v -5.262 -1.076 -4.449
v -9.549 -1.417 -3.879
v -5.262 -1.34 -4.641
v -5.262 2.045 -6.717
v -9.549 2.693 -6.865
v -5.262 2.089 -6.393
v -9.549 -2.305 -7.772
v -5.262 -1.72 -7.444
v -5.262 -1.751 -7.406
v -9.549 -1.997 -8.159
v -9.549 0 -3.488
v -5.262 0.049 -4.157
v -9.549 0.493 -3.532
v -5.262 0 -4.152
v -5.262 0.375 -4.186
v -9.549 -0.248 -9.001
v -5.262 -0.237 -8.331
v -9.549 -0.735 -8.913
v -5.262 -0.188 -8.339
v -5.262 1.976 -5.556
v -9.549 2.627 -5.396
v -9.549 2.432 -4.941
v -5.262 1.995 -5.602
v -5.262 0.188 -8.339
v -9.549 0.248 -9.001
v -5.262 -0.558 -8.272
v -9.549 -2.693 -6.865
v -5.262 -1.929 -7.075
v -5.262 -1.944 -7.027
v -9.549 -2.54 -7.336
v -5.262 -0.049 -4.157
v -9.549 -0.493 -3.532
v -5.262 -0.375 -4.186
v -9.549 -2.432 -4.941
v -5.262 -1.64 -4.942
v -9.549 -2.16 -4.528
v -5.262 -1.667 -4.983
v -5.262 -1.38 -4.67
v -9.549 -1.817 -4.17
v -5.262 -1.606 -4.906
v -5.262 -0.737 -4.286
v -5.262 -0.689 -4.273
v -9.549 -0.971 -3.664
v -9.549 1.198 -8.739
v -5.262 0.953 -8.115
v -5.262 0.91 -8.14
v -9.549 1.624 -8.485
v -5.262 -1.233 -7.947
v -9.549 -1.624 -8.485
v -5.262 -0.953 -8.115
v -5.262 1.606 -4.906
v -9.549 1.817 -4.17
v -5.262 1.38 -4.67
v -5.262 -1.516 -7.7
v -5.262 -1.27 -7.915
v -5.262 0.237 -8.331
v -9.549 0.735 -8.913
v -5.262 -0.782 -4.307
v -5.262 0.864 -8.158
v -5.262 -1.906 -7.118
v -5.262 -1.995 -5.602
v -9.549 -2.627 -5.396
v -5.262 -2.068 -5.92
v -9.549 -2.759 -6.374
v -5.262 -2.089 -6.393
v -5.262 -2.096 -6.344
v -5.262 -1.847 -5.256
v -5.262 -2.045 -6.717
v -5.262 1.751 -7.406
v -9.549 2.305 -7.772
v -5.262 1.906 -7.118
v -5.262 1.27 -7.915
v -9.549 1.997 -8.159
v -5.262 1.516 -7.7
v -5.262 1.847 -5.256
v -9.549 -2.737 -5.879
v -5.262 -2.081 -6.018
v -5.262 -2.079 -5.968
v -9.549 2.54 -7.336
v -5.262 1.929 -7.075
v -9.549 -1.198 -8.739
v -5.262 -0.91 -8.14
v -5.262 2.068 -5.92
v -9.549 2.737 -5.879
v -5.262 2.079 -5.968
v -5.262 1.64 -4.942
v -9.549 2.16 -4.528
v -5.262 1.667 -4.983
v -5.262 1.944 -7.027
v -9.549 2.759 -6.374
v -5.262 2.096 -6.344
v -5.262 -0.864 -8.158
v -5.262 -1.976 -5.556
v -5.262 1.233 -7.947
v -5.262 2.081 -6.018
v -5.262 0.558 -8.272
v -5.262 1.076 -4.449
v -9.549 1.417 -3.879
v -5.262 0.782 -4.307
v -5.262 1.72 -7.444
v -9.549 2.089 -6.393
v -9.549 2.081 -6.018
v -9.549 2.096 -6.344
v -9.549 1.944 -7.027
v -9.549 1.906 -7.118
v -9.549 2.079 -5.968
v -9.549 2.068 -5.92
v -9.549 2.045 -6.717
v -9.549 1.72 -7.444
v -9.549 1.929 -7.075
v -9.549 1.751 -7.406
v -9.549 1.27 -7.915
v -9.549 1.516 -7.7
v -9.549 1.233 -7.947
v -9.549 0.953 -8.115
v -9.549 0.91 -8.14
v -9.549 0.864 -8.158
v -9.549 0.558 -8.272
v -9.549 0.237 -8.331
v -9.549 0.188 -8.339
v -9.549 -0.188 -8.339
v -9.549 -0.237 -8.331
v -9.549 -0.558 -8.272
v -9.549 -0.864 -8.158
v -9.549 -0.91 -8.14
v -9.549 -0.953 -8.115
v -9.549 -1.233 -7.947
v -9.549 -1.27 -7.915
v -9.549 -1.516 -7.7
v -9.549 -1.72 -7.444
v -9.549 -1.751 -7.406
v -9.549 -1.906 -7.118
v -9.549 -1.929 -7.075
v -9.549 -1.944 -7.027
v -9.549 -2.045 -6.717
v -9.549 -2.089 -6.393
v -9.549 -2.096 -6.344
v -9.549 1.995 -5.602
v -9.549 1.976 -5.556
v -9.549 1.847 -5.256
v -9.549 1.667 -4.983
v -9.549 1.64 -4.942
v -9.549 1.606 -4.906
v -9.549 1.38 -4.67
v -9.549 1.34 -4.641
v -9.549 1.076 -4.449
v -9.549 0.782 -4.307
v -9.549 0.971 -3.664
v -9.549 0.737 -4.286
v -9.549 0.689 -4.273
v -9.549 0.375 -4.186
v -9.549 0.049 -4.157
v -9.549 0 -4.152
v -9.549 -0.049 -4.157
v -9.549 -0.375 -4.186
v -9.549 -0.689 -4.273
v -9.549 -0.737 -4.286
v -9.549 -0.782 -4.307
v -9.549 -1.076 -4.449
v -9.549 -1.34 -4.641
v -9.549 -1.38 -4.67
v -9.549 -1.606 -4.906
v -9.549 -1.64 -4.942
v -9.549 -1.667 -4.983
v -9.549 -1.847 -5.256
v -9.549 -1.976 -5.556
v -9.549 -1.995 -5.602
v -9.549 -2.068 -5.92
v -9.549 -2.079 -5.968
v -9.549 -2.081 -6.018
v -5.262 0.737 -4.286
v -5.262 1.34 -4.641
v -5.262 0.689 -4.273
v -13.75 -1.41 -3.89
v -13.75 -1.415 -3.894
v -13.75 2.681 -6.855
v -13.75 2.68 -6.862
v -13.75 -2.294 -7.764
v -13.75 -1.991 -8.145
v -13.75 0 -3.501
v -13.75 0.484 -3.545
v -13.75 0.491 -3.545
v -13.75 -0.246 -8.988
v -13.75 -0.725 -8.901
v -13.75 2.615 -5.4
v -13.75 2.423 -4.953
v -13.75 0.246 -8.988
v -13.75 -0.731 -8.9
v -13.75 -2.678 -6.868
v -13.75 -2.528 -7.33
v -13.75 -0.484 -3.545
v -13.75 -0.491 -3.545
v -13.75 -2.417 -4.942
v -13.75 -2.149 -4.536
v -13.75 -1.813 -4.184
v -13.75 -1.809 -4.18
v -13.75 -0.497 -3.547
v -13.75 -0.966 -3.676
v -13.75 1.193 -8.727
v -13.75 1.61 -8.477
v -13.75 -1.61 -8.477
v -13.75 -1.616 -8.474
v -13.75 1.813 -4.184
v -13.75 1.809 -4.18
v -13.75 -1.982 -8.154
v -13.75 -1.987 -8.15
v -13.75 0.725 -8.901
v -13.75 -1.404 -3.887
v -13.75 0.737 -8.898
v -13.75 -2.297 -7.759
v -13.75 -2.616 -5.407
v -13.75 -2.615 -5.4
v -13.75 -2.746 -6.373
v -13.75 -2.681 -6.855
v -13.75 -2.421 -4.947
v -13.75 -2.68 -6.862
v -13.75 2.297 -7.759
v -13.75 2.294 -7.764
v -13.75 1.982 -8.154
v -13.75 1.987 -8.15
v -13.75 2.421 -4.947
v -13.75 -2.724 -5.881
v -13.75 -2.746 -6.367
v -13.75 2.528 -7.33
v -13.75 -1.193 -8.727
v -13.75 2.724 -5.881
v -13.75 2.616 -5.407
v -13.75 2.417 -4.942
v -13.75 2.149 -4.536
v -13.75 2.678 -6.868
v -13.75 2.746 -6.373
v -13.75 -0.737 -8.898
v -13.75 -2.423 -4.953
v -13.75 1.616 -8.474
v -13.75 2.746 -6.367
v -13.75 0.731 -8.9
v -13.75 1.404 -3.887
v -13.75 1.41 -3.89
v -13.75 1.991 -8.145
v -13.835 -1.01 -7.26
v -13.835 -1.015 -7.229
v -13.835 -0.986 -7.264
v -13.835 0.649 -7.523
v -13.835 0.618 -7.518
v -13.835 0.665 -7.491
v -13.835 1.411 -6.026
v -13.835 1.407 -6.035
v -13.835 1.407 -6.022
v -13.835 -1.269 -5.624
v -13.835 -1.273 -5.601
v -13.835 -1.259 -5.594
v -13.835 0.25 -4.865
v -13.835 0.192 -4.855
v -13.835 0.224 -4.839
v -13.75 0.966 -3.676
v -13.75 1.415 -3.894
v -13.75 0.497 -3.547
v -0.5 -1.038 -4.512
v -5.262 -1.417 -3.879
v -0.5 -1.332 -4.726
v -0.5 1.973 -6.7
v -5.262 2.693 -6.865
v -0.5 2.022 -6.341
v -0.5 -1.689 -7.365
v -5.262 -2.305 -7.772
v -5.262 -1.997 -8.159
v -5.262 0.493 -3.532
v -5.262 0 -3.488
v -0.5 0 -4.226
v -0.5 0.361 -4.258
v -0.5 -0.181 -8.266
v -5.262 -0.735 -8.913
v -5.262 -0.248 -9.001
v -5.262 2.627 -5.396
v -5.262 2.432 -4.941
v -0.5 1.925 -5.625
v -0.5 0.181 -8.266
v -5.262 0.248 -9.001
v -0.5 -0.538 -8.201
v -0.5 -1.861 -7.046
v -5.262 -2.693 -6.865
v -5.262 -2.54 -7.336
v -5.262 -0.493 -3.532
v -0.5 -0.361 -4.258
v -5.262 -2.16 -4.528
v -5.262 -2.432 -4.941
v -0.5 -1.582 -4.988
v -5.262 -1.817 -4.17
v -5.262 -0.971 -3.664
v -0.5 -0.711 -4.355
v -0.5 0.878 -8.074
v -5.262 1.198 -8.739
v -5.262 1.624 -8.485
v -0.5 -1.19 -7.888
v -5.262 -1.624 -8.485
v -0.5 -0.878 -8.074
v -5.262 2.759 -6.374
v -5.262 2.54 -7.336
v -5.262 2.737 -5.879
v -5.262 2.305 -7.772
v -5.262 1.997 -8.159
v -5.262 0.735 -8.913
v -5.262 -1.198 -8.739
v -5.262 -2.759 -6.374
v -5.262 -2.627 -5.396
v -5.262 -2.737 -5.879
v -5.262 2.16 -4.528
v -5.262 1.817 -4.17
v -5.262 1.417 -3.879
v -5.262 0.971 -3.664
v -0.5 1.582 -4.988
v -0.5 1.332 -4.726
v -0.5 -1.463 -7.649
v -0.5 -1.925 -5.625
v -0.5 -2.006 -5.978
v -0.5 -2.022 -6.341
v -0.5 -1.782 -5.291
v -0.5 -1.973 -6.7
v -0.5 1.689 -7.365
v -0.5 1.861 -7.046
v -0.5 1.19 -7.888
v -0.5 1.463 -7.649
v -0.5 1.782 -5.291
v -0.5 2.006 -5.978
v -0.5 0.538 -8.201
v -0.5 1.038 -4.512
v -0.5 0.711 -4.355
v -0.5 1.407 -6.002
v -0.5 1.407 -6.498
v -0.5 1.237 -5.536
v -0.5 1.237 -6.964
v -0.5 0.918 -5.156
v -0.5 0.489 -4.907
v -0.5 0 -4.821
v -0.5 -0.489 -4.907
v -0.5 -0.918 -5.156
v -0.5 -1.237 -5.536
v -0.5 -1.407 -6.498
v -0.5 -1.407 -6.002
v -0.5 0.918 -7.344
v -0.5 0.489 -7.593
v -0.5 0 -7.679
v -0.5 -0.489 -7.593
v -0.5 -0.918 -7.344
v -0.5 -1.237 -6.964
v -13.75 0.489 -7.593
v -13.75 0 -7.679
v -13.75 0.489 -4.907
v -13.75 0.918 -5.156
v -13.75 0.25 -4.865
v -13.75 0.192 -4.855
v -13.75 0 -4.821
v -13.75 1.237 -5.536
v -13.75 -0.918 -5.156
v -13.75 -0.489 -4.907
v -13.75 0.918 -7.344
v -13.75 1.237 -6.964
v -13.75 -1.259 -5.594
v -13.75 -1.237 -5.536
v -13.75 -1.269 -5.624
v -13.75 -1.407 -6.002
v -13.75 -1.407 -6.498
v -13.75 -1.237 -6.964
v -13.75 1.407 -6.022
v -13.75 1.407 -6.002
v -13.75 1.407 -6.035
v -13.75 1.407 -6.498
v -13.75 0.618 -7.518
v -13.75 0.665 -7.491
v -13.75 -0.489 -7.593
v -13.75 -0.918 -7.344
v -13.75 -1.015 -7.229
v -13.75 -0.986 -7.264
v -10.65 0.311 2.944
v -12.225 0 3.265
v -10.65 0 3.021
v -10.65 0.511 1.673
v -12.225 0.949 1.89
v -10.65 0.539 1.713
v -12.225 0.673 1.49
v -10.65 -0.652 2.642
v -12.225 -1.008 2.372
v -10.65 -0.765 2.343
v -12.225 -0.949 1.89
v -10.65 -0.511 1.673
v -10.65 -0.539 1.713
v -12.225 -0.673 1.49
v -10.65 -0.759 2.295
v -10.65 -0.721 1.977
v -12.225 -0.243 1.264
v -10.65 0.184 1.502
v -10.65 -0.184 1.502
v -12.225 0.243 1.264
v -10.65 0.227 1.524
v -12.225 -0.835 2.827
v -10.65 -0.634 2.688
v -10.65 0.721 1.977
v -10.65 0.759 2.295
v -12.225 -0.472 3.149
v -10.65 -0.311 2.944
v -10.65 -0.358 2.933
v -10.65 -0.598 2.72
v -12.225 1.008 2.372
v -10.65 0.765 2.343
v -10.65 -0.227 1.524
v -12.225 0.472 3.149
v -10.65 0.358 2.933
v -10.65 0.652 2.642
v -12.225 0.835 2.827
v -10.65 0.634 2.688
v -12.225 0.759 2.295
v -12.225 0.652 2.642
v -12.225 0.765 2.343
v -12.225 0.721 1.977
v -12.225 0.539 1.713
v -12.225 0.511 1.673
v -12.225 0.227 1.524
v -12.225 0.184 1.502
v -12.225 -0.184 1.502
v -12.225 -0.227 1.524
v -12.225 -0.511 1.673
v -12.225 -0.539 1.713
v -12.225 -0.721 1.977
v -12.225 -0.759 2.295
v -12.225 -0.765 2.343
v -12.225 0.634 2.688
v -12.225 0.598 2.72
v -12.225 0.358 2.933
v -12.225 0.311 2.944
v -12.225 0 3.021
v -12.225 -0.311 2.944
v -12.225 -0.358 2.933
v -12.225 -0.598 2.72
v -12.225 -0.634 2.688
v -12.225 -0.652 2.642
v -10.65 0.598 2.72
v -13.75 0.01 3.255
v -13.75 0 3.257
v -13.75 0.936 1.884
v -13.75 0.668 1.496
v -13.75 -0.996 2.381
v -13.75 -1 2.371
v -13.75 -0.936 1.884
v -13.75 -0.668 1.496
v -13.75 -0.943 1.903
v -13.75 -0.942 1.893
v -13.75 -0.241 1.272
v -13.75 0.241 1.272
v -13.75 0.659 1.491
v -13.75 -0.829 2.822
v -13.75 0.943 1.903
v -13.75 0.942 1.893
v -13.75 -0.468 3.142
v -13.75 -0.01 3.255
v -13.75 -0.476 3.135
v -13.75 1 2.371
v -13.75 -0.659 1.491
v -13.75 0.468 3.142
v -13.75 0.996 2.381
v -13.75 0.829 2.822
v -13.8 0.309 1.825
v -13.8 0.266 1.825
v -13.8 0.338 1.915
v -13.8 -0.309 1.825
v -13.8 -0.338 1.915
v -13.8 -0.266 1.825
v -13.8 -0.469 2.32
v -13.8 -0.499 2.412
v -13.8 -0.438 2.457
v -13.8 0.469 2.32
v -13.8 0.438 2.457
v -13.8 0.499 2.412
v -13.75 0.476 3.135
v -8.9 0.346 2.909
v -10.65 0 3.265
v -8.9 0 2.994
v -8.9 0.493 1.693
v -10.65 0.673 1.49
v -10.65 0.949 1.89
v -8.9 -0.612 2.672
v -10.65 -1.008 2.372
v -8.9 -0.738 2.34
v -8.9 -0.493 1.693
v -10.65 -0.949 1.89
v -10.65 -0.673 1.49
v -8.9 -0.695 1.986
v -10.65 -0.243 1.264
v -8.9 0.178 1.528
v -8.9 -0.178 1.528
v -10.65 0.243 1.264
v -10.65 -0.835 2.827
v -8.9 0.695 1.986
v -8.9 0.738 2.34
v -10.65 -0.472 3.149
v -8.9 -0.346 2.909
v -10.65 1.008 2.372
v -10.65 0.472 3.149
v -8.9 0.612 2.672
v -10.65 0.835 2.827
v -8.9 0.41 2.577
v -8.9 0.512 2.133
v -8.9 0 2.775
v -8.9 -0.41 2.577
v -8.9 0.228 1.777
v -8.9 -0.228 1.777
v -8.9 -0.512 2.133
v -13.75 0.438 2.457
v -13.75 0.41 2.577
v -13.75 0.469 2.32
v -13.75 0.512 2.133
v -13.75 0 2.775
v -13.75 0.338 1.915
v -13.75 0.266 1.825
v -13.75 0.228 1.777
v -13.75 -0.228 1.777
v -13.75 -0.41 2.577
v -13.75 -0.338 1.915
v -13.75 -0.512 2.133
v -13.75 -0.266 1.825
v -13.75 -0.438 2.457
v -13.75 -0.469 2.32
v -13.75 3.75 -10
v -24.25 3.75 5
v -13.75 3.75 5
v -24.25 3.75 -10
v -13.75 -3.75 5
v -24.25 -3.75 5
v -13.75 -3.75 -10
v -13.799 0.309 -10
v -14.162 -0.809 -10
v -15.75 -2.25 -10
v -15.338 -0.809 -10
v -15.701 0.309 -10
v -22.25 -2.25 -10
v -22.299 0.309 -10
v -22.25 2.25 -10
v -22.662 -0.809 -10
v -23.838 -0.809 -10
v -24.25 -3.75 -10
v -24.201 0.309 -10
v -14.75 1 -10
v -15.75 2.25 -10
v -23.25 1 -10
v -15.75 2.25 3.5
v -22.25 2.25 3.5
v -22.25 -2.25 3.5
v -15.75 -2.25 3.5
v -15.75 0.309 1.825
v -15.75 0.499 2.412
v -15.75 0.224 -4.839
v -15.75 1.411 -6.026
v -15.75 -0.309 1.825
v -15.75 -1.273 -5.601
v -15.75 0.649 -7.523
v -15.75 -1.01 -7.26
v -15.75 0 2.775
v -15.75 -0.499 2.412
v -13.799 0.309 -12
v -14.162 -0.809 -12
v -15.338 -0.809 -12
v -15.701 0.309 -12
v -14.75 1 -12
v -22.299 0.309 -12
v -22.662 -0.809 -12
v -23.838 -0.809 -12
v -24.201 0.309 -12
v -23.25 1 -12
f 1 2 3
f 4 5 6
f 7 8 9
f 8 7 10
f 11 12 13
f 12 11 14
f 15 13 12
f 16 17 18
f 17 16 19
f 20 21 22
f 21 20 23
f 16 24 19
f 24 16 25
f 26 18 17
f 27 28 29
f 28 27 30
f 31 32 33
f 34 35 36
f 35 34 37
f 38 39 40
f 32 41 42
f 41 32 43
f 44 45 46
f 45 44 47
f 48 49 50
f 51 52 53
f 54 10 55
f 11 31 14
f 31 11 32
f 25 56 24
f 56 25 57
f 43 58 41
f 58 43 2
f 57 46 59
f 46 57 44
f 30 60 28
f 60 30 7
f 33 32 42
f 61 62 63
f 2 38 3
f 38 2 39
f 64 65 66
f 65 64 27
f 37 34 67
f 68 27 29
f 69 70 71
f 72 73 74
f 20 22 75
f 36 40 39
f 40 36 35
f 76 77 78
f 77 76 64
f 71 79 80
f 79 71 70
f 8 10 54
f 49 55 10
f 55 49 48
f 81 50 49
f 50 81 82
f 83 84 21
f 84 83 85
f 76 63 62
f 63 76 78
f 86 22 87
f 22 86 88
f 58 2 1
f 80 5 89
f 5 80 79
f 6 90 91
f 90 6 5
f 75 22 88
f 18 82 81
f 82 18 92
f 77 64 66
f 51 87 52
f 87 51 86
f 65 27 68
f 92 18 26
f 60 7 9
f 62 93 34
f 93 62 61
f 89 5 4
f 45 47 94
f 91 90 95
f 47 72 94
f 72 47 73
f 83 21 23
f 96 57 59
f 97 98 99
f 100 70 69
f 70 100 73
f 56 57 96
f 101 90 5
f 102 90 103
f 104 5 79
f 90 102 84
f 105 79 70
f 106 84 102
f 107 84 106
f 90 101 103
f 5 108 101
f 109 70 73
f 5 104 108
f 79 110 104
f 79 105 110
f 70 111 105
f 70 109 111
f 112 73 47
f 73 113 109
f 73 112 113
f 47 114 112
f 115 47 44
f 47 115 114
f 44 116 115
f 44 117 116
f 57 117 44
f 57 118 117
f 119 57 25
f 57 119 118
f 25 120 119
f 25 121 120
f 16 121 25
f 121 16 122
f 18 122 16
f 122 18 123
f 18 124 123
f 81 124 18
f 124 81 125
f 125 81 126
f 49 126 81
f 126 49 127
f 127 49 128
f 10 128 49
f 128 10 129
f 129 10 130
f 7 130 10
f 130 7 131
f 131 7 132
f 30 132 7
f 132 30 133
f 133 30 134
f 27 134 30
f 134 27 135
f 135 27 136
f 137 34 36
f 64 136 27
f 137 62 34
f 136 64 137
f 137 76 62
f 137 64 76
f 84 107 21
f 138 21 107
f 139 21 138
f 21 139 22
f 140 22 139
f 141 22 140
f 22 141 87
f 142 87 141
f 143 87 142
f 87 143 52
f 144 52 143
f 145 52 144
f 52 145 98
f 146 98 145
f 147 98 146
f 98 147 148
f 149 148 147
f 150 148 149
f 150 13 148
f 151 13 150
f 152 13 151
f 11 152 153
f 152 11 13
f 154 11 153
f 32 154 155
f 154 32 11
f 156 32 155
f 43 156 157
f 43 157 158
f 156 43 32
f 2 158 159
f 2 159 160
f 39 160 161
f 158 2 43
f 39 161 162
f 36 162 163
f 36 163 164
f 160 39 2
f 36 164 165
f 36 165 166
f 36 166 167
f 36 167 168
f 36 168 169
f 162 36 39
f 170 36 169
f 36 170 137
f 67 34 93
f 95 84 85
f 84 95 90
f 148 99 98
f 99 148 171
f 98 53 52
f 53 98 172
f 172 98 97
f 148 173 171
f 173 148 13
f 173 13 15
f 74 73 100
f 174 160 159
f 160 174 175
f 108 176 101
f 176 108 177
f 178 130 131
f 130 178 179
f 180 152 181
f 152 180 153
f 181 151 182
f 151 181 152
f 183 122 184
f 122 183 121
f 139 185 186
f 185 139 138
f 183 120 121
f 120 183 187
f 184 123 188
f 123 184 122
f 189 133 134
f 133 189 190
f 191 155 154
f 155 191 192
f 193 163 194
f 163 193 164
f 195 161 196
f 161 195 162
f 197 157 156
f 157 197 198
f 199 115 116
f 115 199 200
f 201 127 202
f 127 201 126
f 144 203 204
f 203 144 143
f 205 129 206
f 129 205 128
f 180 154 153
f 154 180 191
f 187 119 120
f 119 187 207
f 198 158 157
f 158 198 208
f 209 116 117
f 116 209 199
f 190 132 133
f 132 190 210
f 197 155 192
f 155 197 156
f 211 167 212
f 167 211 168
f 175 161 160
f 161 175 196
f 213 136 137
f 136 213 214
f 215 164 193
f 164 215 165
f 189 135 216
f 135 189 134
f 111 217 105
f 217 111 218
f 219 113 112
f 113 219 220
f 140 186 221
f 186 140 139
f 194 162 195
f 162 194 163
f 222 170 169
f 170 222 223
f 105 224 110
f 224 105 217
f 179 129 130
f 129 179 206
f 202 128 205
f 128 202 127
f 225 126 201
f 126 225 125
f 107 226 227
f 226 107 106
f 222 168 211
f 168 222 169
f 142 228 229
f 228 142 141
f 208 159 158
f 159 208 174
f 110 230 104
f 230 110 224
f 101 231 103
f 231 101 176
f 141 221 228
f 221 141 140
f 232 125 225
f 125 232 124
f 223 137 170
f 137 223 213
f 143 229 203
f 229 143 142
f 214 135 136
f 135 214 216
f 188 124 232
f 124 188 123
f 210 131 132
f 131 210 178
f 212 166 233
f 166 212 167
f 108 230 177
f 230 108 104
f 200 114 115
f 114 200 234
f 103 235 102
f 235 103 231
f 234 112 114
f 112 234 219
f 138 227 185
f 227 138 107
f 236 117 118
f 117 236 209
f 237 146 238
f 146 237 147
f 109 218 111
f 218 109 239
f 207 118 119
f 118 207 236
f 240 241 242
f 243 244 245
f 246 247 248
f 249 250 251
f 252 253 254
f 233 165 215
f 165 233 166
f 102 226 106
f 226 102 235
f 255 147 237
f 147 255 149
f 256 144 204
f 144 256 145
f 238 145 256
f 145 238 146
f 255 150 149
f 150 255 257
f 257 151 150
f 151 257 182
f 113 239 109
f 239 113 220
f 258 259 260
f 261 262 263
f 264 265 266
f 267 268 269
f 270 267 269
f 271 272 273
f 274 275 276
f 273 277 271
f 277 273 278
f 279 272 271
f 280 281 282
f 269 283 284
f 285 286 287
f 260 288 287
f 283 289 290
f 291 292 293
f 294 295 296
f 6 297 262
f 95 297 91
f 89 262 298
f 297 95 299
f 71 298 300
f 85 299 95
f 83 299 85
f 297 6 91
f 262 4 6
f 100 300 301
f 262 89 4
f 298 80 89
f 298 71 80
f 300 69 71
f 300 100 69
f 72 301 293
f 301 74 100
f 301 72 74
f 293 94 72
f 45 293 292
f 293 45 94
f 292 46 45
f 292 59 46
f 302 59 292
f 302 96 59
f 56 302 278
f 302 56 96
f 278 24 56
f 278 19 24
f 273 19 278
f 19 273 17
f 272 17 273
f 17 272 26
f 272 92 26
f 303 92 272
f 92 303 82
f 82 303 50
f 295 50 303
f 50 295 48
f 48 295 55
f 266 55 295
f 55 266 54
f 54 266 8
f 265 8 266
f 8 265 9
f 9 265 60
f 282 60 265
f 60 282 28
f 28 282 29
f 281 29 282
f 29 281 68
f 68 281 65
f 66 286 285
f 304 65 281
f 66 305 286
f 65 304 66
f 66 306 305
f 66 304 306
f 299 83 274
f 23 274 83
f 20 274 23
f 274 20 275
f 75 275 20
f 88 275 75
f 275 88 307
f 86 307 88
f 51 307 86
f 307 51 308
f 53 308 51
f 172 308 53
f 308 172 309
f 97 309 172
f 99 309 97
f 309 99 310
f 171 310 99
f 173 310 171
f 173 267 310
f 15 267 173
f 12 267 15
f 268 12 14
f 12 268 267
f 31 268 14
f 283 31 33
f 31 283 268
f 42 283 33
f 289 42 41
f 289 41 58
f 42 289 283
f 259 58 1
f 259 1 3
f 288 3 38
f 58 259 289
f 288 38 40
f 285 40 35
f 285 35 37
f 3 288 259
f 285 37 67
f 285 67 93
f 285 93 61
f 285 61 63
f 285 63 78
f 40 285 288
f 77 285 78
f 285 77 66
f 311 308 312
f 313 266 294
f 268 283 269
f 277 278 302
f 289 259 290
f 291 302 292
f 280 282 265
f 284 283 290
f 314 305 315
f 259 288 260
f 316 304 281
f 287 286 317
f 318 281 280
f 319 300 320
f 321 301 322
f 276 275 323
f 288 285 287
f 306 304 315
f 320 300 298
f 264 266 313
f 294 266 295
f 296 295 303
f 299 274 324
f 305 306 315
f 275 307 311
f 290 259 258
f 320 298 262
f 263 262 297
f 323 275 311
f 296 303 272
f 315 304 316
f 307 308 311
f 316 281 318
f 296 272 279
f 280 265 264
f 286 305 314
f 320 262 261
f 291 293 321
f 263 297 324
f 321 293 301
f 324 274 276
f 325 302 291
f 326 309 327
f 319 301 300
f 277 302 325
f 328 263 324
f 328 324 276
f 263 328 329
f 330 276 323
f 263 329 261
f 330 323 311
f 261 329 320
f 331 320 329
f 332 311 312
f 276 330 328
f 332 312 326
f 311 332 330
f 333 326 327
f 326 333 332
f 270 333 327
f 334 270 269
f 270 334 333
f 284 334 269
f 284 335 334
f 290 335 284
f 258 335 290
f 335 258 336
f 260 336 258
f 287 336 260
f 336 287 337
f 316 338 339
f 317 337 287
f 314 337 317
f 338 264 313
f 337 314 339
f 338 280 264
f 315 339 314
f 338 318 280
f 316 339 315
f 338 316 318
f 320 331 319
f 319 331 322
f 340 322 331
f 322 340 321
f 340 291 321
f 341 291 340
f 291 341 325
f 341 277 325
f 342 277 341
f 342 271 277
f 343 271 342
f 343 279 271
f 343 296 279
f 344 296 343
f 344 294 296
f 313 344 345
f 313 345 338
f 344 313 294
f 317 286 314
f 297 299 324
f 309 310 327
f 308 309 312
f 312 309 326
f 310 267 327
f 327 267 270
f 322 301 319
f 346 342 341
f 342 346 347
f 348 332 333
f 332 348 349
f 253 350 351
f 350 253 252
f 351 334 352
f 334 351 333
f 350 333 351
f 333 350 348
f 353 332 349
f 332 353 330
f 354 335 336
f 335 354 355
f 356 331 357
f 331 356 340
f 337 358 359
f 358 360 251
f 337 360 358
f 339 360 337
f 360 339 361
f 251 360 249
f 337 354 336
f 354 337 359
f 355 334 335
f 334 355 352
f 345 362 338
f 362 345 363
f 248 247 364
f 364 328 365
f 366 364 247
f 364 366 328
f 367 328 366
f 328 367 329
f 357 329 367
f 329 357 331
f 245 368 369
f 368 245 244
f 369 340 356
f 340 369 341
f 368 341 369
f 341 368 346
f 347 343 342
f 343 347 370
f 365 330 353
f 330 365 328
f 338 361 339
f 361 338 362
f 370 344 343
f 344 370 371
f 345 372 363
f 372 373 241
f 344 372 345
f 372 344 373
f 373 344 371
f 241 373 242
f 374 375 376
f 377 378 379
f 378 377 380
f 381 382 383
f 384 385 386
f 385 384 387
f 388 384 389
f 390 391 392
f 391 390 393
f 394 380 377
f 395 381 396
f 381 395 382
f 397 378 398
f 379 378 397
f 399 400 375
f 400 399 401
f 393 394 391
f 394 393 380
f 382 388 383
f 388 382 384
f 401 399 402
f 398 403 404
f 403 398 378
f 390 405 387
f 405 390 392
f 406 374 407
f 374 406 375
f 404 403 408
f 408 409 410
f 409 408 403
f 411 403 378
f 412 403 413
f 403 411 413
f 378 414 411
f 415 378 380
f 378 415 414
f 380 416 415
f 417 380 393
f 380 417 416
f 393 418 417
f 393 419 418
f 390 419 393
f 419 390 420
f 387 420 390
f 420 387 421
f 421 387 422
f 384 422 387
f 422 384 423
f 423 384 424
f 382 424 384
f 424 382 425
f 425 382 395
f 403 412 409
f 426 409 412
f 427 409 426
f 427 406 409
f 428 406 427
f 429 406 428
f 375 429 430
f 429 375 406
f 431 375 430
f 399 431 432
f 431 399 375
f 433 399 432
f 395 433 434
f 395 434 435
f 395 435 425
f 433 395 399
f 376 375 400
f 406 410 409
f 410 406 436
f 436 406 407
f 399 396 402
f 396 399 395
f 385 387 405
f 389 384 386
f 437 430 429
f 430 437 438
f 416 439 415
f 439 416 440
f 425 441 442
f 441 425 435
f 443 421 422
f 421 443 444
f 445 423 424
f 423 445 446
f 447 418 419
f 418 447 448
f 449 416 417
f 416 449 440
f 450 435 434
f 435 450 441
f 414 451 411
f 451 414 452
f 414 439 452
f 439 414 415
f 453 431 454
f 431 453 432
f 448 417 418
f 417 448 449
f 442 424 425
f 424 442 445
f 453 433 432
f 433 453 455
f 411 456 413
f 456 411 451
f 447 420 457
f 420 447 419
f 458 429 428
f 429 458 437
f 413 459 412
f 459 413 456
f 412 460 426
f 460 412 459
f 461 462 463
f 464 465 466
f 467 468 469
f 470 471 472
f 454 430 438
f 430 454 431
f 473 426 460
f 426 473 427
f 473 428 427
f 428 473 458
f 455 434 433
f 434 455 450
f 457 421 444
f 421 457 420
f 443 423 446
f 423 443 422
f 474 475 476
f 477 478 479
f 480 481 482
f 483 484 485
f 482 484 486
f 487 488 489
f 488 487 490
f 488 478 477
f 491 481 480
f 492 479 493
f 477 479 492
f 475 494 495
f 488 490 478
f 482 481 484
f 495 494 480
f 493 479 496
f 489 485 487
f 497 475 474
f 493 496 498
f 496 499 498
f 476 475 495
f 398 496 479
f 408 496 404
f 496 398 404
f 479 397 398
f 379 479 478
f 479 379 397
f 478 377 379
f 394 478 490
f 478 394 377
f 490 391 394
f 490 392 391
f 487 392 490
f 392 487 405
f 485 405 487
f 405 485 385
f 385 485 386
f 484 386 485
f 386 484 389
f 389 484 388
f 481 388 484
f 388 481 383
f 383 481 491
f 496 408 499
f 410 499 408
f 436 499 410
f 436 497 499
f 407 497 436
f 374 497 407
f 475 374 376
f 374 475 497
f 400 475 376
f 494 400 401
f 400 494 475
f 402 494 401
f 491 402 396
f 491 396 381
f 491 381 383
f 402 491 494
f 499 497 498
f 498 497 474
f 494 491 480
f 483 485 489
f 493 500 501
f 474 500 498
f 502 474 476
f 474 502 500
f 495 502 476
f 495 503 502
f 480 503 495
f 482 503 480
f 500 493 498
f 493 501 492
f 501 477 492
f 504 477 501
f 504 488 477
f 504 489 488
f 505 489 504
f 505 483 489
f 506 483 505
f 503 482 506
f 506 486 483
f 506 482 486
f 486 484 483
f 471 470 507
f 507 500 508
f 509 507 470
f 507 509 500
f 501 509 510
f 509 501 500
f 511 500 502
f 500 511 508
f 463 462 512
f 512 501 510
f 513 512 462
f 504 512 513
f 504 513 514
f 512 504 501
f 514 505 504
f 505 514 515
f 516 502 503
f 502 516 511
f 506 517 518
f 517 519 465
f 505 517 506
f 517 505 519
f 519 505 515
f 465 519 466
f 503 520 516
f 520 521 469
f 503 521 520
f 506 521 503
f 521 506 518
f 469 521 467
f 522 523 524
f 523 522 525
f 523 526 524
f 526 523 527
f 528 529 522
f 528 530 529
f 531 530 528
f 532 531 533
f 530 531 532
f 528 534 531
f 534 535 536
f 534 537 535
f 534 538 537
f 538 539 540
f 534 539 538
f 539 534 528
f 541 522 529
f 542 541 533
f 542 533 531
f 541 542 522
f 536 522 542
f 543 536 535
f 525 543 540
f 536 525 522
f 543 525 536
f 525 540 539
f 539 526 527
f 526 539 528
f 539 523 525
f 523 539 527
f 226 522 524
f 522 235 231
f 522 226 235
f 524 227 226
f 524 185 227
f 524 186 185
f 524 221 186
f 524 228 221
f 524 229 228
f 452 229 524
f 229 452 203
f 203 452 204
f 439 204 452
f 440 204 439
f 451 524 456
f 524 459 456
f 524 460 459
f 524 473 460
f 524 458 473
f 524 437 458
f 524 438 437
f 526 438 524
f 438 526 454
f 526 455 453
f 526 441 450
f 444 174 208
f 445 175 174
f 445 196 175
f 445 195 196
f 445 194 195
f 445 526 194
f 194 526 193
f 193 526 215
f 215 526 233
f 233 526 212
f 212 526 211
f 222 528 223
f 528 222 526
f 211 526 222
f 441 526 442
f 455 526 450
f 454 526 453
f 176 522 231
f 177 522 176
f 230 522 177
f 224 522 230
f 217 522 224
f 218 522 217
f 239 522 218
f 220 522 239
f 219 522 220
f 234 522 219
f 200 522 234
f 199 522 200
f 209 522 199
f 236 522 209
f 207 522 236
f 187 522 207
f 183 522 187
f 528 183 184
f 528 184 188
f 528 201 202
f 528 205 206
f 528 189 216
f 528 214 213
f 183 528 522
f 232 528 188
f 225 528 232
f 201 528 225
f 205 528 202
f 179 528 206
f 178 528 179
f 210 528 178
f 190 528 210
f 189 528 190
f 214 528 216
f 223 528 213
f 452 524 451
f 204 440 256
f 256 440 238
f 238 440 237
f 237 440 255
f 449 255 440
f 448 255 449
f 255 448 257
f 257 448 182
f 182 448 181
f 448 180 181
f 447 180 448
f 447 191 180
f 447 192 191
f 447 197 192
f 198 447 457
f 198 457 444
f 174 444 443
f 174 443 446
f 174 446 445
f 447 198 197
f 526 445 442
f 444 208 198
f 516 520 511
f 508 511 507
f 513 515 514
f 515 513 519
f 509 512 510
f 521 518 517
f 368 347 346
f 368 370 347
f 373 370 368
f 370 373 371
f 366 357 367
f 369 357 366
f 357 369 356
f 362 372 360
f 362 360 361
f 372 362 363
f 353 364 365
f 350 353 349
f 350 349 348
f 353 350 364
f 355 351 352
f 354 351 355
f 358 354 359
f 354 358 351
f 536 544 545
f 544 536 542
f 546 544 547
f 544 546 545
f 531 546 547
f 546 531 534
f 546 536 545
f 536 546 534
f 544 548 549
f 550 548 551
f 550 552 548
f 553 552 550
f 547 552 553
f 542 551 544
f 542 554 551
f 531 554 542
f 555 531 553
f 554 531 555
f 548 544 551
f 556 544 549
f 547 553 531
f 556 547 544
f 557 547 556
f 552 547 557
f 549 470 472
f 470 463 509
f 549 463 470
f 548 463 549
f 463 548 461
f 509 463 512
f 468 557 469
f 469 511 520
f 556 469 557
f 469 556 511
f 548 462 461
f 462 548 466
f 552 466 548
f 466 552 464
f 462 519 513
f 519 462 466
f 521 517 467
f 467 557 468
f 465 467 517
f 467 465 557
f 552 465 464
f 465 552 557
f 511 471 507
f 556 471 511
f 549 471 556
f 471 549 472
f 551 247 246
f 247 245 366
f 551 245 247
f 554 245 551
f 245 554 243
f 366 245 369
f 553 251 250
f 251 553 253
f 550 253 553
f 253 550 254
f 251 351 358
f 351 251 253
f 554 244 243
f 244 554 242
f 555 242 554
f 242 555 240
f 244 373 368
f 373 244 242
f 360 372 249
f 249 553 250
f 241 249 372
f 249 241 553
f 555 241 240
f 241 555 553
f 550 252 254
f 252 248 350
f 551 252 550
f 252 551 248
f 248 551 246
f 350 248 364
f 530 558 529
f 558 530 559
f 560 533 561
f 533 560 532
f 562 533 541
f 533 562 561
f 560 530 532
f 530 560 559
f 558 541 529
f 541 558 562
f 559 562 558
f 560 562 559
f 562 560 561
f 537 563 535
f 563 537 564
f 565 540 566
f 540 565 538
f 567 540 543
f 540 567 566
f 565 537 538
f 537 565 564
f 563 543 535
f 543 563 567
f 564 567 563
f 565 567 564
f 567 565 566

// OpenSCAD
// file: PressureCoupling.scad
// This file was origininally written by Stephen Glow and has been
// extensively modified by Robert L. Read.

use <BarbGenerator-v3.scad>;

// This dile describes the geometry of the freeflow venturi tube.
// I have tried to document the various parameters, most of which can be
// changed to adjust tube geometry.
//
// These are just openscad special variables related to rendering.
// They define how many fascets in an arc.  I have them set for pretty high 
// resolution (slow) rendering.  Making these bigger produces faster but 
// rougher renderings
$fa = 1;      // Minimum angle fragment
$fs = .1;     // Minimum size of a fragment

// M for margin.  I use this to make things overlap slightly for better rendering
M = .01;

// These are the X axis offsets of the two pressure sensors from the end of the pcb.
// The sensors are both centered in the Y axis, so I don't include that here.
// These values are correct for the rev-2 freeflow board.
pcb_tap_outer  = in2mm(0.3);
pcb_tap_center = in2mm(1.6);

// Tubing that connects to the venturi outer & inner diameter
tube_od = 22;
tube_id = 18;

// Amount that my venturi will overlap the tube on the enterence.
// I'm using a female enterence and male exit
tube_overlap = 10;

// Thickness of the wall of the overlapping section
overlap_thickness = 1.25;

// The outer diameter of the venturi tube enterence will be the 
// same as the tube_id.  The throat diameter is the inner diameter
// of the constricted throat of the venturi.  Smaller gives larger
// readings, especially at low flow rates, but also causes more
// pressure drop through the tube.
throat_d = tube_id * 0.4;
echo( "throat_d ", throat_d );

// These angles define how quickly the venturi will narrow on 
// both entry and exit.  Angles are relative to the center line
// running through the tube.  These angles are pretty typical for
// venturi tubes according to my research.
angle_entry = 12;
angle_exit = 7;

// The exit of the venturi will have the same inner/outer diameter 
// as the tube that attaches to the entry.  I'm assuming that a fitting
// sized for that tube will be connected to the exit end
exit_id = tube_id;
exit_od = tube_od;

// Find the entry and exit distance based on the change of diameter
// and the angles.  
Lnarrow = (tube_id - throat_d)/2 / tan(angle_entry);
Lexpand  = (exit_id - throat_d)/2 / tan(angle_exit);

// This is the length of the exit section.  The fitting attached to the 
// end of the venturi will overlap by up to this much
exit_overlap = 10;

// The length of the throat section is customarily the same as the
// throat diameter
// Hack:
// Lthroat = throat_d;
Lthroat = 0;

// The length of the enterence to the venturi (before it starts to narrow)
// The outer tap is located in this area, so this is somewhat dictated by the PCB dimensions

pcb_dtap = pcb_tap_center - pcb_tap_outer;

Lentry = pcb_dtap - Lnarrow - Lthroat/2 + tube_id/2;

// There will be two holes in the side of the tube where we will sense
// pressure.  This is the diameter of those holes
tap_d = 2.7;

module CouplerWTap() {
    difference() {
        Coupler();
        TapHole();
    }
}



// This module is the venturi tube itself without the board mount
module Coupler()
{
   // This is the Z offset of the bottom of the PCB relative to the bottom of the tube
   pcb_zoff = tube_overlap+Lentry+Lnarrow+Lthroat/2-pcb_tap_center;

   // OK, build the venturi tube.
   difference()
   {
      // This section is the outer shell of the venturi tube.
      union()
      {

         // This first section is the area in which the venturi tube overlaps
         // the tubing that connects to it.
         cylinder( d=tube_od+2*overlap_thickness, h=tube_overlap );

          L = Lentry/2;
         translate( [0,0,tube_overlap-M] )
            cylinder( d1=tube_od+2*overlap_thickness, d2=exit_od, h=L+M );

         // This last section is the outer part of the section which will fit
         // into the fitting 
         translate( [0,0,tube_overlap+L-M] )
            cylinder( d=exit_od, h=exit_overlap+M );
      }

      // Everything after here is removed from that outer shell.

      // This is the area in which the external tube will enter
      translate( [0,0,-M] ) 
         cylinder( d=tube_od, h=tube_overlap+M );

      // This is the outer section of the venturi.
      // The outer tap will end up in the center of this section.
      translate( [0,0,tube_overlap-M] ) 
         cylinder( d=tube_id, h=Lentry+M );

      // This is the narrowing entry part
      translate( [0,0,tube_overlap+Lentry-M] ) 
         cylinder( d1=tube_id, d2=tube_id, h=Lnarrow+M );

   }
}

module TapHole() 
{  
   //pcb_zoff = tube_overlap+Lentry+Lnarrow+Lthroat/2-pcb_tap_center;
          // Add a hole for the outer pressure sensor tap
    L = Lentry/2;
    z = tube_overlap +L/2;
      translate( [0,0,z] )
         rotate( [0,90,0] ) cylinder( d=tap_d, h=tube_od );

}

function in2mm(x) = x*25.4;

CouplerWTap();


/* [Hidden] */
inches_to_mm = 25.400;

// Input tubing inside diameter, e.g. 0.5 for 1/2 inch (US); 0.625 for 5/8, 0.75 for 3/4, etc
input_size = 3/16;
// Output tubing inside diameter, e.g. 0.17 for 1/4 inch OD (outside diameter) vinyl tubing (US); 0.25 for 1/4 inch ID (inside diameter) (US); 0.375 for 3/8 inch ID
output_size = input_size;

output_size_mm = output_size*25.4;

//p_input_size = 0.06889764;
//p_output_size = 0.06889764;

p_input_size = 0.06889764;
p_output_size = p_input_size;

p_output_size_mm = p_output_size*25.4;

barbLength = 7;
barbHeight = 7;
outerBarbRadius = 1.93;
innerBarbRadius = outerBarbRadius - 1;

// Number of hose inputs - which is input and which is output doesn't matter but the input will be on the bottom of the print so should be the larger of the two
inputs = 1;
// Number of hose outputs
outputs = 1;
//  Measurement system for inputs - US in inches, Metric in mm
input_units = "US"; // [US,Metric]
// Measurement system for outputs
output_units = "US"; // [US,Metric]
// Input tubing inside diameter, e.g. 0.5 for 1/2 inch (US); 0.625 for 5/8, 0.75 for 3/4, etc
input_size = 3/16;
// Output tubing inside diameter, e.g. 0.17 for 1/4 inch OD (outside diameter) vinyl tubing (US); 0.25 for 1/4 inch ID (inside diameter) (US); 0.375 for 3/8 inch ID
output_size = 3/16;
// Connector type - Use inline for a single input and single output
connector_type = "inline"; // [inline,vault]
// Inline junction type - currently only round is supported
inline_junction_type = "round"; // [round,hex,none]

translate([tube_od+2.5,0,14.1])
rotate([0,270,0])
input_barb( input_units == "US" ? input_size * inches_to_mm : input_size );
    
// main file
use <BarbGenerator-v3.scad>;
use <PressureCoupling.scad>;

outerHeight = 15;
innerHeight = 12;
outerWidth = 7.5;
innerWidth = 4.5;
outerLength = 10.5;
innerLength = 6.5;

// $fn = 30;



barbLength = 7;
barbHeight = 7;
outerBarbRadius = 1.93;
innerBarbRadius = outerBarbRadius - 1;

pegRadius = 1;
pegLength = 2;
pegOffsetX = 0;
// pegOffsetY = 3.25;
pegOffsetY = 4.25;
pegOffsetZ = -pegLength;

/* [Hidden] */
inches_to_mm = 25.400;

// Input tubing inside diameter, e.g. 0.5 for 1/2 inch (US); 0.625 for 5/8, 0.75 for 3/4, etc
input_size = 3/16;
// Output tubing inside diameter, e.g. 0.17 for 1/4 inch OD (outside diameter) vinyl tubing (US); 0.25 for 1/4 inch ID (inside diameter) (US); 0.375 for 3/8 inch ID
output_size = input_size;

output_size_mm = output_size*25.4;

//p_input_size = 0.06889764;
//p_output_size = 0.06889764;

p_input_size = 0.06889764;
p_output_size = p_input_size;

p_output_size_mm = p_output_size*25.4;


// raise the upper port a bit more 
raise_upper_port = 1;

module box()
{
    cylinder_hole_fudge = 0.6;
    union(){
        difference(){

            translate([0,0,outerHeight/2]){
                cube([outerWidth, outerLength, outerHeight], center=true);
            }
            translate([0,0,outerHeight/2 -5]) {
                cube([innerWidth, innerLength, innerHeight+10], center=true);
            }
            translate([0,0,raise_upper_port+3*outerHeight/4]) 
            {
                rotate([90,270,0])
                cylinder(barbLength, 
                    cylinder_hole_fudge*p_output_size_mm/2, 
                    cylinder_hole_fudge*p_output_size_mm/2, center=false);
            }
            translate([0,0,outerHeight/4]) 
            {
                rotate([90,279,0])
                cylinder(barbLength, 
                    cylinder_hole_fudge*output_size_mm/2, 
                    cylinder_hole_fudge*output_size_mm/2, center=false);
            }
        }

// pegs
        translate([pegOffsetX, -pegOffsetY, pegOffsetZ]){
            cylinder(pegLength, pegRadius, pegRadius, center=false);
        }
        translate([pegOffsetX, pegOffsetY, pegOffsetZ]){
            cylinder(pegLength, pegRadius, pegRadius, center=false);
        }
    }
}


// Number of hose inputs - which is input and which is output doesn't matter but the input will be on the bottom of the print so should be the larger of the two
inputs = 1;
// Number of hose outputs
outputs = 1;
//  Measurement system for inputs - US in inches, Metric in mm
input_units = "US"; // [US,Metric]
// Measurement system for outputs
output_units = "US"; // [US,Metric]
// Input tubing inside diameter, e.g. 0.5 for 1/2 inch (US); 0.625 for 5/8, 0.75 for 3/4, etc
input_size = 3/16;
// Output tubing inside diameter, e.g. 0.17 for 1/4 inch OD (outside diameter) vinyl tubing (US); 0.25 for 1/4 inch ID (inside diameter) (US); 0.375 for 3/8 inch ID
output_size = 3/16;
// Connector type - Use inline for a single input and single output
connector_type = "inline"; // [inline,vault]
// Inline junction type - currently only round is supported
inline_junction_type = "round"; // [round,hex,none]


/* [Manifold] */

// Vault wall thickness in mm - increase for higher pressure connections
vault_wall_thickness = 3.0;
// Add support under vault for printing
vault_support = "yes"; // [yes,no]
// Ratio of connector diameter to space allocated in vault - increase to allow more space for hose clamps, etc.
vault_connector_ratio = 1.8;

/* [Advanced] */

// Width of junction as ratio of tubing I.D.
inline_junction_width = 0.8;
// Strength factor - use more than 1 for thicker walls to handle higher pressure and stronger clamping
strength = 2.0;
// Number of barbs on input - use 3 for larger tubing to reduce overall print height
input_barb_count = 3;
// Number of barbs on output - use 4 for smaller tubing
output_barb_count = 4;




module simple_adapter( input_diameter, output_diameter )
{
  assign ( junction_height = input_barb_count )
  {
    union() {

      input_barb( input_diameter );
//      junction( input_diameter, output_diameter+1, 0 );
//     output_barb( input_diameter, output_diameter, junction_height );
    }
  }
}

module hat_with_barb () {



// barb();


translate([barbLength+outerLength+1,0,outerHeight/4])
rotate([0,270,0])
simple_adapter( input_units == "US" ? input_size * inches_to_mm : input_size, 
              output_units == "US" ? output_size * inches_to_mm : output_size );
    
translate([barbLength+outerLength-7.4,0,raise_upper_port+ (3*outerHeight/4)])
rotate([0,270,0])
simple_adapter( input_units == "US" ? p_input_size * inches_to_mm : p_input_size, 
              output_units == "US" ? p_output_size * inches_to_mm : p_output_size );
    
    // box
rotate([0,0,90])
box();
    
}


translate([-19,0,-10])
hat_with_barb();






echo(version=version());
